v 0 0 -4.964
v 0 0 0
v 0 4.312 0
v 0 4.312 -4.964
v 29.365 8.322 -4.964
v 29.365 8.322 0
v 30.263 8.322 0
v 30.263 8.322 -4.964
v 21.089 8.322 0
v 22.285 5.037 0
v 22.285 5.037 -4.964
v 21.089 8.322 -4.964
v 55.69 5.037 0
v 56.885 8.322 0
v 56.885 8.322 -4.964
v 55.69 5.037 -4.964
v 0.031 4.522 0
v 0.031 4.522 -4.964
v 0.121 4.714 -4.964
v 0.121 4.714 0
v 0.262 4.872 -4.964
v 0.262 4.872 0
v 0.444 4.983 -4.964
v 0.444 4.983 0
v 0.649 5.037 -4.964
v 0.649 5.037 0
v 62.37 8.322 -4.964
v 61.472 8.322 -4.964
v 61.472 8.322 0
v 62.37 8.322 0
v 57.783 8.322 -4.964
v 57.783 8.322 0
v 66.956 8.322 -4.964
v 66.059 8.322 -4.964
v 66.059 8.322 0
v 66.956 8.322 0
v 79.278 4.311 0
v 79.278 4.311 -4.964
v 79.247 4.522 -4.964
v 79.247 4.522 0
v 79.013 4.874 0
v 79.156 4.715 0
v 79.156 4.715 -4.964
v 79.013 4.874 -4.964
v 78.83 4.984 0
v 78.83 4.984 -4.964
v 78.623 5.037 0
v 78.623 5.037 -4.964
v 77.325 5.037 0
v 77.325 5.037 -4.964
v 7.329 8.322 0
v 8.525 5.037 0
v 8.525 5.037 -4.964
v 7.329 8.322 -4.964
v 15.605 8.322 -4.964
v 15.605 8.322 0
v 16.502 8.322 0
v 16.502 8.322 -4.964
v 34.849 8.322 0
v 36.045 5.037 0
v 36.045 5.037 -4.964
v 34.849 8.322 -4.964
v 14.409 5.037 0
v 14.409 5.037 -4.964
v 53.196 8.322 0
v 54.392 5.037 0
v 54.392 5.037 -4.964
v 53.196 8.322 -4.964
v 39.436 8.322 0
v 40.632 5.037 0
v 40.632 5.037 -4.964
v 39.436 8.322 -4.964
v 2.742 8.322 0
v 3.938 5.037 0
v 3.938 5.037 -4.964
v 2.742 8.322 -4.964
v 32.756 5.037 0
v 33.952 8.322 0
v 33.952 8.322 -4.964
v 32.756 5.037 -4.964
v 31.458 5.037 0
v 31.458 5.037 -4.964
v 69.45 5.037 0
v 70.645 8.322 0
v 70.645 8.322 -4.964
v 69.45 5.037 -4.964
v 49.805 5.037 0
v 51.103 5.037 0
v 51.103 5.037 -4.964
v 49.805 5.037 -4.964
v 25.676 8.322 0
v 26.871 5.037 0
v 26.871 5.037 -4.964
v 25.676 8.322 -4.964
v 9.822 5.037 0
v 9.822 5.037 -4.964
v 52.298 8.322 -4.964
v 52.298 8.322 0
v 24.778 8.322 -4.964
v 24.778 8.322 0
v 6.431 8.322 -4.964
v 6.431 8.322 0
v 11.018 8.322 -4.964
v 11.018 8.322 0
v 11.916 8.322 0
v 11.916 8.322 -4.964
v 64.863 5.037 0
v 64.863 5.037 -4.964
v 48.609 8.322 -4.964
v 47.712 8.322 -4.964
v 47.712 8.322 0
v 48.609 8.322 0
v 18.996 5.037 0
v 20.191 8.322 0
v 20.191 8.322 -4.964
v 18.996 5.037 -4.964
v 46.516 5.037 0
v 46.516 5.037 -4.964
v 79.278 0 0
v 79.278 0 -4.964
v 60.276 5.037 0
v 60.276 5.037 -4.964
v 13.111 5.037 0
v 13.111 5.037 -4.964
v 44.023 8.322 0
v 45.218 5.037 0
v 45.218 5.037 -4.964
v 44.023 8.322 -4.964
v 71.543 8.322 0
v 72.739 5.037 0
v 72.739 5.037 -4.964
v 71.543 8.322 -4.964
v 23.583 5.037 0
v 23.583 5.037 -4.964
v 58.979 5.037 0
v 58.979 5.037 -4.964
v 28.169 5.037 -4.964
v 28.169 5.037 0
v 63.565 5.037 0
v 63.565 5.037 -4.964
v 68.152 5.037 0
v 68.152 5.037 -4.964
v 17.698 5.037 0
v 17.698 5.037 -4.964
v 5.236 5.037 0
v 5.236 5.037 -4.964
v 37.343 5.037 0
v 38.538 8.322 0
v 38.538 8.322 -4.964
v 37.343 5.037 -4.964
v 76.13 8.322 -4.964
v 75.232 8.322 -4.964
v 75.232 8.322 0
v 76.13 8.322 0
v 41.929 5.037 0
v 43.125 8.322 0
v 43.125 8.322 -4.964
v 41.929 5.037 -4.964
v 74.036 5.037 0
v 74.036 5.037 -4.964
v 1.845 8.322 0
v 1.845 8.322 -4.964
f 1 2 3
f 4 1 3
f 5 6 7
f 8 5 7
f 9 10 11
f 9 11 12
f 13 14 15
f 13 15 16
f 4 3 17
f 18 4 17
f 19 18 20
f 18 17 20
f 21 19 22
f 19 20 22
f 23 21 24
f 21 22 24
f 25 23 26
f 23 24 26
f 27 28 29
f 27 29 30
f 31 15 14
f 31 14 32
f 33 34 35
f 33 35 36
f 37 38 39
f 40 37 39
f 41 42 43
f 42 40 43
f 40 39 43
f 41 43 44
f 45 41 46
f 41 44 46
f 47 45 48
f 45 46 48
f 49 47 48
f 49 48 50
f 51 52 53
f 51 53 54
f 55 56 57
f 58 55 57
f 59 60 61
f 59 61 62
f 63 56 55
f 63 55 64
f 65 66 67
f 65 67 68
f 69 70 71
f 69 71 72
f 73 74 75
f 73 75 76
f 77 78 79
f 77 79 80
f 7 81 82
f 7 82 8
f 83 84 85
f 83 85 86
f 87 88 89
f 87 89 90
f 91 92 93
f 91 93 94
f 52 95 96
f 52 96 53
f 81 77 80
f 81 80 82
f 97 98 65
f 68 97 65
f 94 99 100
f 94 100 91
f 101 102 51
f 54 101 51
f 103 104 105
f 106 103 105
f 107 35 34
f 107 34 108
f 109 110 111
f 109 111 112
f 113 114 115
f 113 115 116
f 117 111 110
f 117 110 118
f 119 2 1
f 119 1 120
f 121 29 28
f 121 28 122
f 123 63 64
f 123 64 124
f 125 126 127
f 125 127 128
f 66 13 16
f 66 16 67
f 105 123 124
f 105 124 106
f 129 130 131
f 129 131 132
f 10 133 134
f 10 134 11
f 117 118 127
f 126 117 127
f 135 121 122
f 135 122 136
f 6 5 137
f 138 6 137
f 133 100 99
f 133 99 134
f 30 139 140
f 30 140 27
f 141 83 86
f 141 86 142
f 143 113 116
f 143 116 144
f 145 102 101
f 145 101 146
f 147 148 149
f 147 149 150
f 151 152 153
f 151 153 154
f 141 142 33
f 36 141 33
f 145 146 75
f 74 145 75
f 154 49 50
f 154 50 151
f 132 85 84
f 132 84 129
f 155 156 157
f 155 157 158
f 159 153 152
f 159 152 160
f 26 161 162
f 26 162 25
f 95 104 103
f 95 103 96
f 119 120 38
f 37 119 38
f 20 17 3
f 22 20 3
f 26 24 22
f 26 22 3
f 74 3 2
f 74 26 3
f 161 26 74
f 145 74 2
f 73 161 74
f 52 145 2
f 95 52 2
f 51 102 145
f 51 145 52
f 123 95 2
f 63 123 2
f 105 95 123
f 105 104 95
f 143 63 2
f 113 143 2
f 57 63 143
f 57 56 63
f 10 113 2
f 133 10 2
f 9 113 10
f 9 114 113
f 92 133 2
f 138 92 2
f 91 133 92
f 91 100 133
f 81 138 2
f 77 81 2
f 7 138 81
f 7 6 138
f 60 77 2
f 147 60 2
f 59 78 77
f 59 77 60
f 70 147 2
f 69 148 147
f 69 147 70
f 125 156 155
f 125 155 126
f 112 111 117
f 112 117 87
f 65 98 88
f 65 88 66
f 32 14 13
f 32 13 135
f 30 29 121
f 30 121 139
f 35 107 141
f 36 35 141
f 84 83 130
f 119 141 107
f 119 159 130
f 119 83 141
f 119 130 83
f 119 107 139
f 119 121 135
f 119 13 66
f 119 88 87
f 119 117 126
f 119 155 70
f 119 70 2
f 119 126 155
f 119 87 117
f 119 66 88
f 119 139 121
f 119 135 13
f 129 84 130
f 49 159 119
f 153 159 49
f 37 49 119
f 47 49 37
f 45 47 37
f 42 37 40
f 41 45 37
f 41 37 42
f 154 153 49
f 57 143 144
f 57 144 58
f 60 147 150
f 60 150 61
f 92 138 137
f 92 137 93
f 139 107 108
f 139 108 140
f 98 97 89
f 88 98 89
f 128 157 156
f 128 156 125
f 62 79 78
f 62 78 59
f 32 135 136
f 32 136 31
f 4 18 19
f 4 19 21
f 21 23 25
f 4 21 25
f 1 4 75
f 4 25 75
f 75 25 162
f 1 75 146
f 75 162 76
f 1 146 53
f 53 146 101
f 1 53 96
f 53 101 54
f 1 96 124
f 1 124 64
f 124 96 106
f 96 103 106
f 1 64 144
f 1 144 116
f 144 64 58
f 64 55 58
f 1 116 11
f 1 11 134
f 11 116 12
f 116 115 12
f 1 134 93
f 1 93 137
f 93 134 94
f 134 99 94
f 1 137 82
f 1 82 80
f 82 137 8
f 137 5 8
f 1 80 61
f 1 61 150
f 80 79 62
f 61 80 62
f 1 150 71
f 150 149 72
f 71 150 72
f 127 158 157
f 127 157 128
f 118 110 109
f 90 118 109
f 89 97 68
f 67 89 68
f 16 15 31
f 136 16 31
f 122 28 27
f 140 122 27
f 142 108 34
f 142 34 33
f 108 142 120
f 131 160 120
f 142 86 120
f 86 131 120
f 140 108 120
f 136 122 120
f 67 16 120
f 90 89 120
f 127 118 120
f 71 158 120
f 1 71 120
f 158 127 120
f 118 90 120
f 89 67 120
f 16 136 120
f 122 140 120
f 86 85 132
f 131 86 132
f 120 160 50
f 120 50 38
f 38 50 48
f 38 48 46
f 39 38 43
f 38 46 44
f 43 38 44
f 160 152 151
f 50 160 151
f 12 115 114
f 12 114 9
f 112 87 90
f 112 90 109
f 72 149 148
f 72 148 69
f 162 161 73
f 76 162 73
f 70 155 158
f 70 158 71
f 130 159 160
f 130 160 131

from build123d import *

# Parameters (mm, degrees)
BLANKSKE_W        = 54.3
BLANKSKE_H        = 5.7
BLANK_DEPTH       = 3.4
TOOTHCUTSIM_DEPTH = 55.704113191
TEETHCUTS_COUNT   = 18
TEETHCUTS_PITCH   = 3.14159265
VERRUNDUNG1_R     = 0.5
VERRUNDUNG2_R     = 0.5
SCALE1_SCALE      = 1.46


with BuildPart() as part:
    # BlankSke → Blank (new body)
    with BuildSketch(Plane.XY):
        with Locations((27.15, 2.85)):
            Rectangle(BLANKSKE_W, BLANKSKE_H)
    extrude(amount=-BLANK_DEPTH)

    # TooCutSkeSim → ToothCutSim (cut, through all)
    with BuildSketch(Plane.XY):
        Polygon((0.44443537, 3.45), (-0.44443537, 3.45), (-1.272613241, 5.7254), (1.272613241, 5.7254), align=None)
    toothcutsim = extrude(amount=-TOOTHCUTSIM_DEPTH, mode=Mode.SUBTRACT)

    # TeethCuts: ToothCutSim ×18
    with Locations(*[(i * TEETHCUTS_PITCH, 0, 0) for i in range(1, TEETHCUTS_COUNT)]):
        add(toothcutsim, mode=Mode.SUBTRACT)

    # Verrundung1
    # the kernel refuses this fillet: 0.5 mm, written as the material it takes off along each edge
    with BuildSketch(Plane(origin=(54.3, 4.682214995, -7.723886484), x_dir=(0, -1, 0), z_dir=(0, 0, 1))) as verrundung1_piece_1:
        with BuildLine():
            CenterArc((1.729554594, -0.5), VERRUNDUNG1_R, 90, 84.086849411)
            Line((1.232214995, -0.44848958), (1.222268203, -0.447459372))
            ThreePointArc((1.222268203, -0.447459372), (0.612687296, -0.233641716), (-0.003420201, -0.009396926))
            Line((-0.003420201, -0.009396926), (0, 0.01))
            Line((0, 0.01), (1.729554594, 0.01))
            Line((1.729554594, 0.01), (1.729554594, 0))
        make_face()
    extrude(amount=12.047772969, mode=Mode.SUBTRACT)

    # Verrundung2
    # the kernel refuses this fillet: 0.5 mm, written as the material it takes off along each edge
    with BuildSketch(Plane(origin=(0, 3.45, 1.242257451), x_dir=(0, -1, 0), z_dir=(0, 0, -1))) as verrundung2_piece_1:
        with BuildLine():
            CenterArc((0.49690298, -0.5), VERRUNDUNG2_R, 90, 83.619583418)
            Line((0, -0.44443537), (-0.00993806, -0.443324077))
            ThreePointArc((-0.00993806, -0.443324077), (-0.01, -0.222217685), (-0.01, 0))
            Line((-0.01, 0), (0, 0.01))
            Line((0, 0.01), (0.49690298, 0.01))
            Line((0.49690298, 0.01), (0.49690298, 0))
        make_face()
    extrude(amount=5.884514902, mode=Mode.SUBTRACT)


with BuildPart() as part_1:
    # Scale1: scaled about (0, 0, 0)
    add(part.part.scale(SCALE1_SCALE))


solid = part_1.part
